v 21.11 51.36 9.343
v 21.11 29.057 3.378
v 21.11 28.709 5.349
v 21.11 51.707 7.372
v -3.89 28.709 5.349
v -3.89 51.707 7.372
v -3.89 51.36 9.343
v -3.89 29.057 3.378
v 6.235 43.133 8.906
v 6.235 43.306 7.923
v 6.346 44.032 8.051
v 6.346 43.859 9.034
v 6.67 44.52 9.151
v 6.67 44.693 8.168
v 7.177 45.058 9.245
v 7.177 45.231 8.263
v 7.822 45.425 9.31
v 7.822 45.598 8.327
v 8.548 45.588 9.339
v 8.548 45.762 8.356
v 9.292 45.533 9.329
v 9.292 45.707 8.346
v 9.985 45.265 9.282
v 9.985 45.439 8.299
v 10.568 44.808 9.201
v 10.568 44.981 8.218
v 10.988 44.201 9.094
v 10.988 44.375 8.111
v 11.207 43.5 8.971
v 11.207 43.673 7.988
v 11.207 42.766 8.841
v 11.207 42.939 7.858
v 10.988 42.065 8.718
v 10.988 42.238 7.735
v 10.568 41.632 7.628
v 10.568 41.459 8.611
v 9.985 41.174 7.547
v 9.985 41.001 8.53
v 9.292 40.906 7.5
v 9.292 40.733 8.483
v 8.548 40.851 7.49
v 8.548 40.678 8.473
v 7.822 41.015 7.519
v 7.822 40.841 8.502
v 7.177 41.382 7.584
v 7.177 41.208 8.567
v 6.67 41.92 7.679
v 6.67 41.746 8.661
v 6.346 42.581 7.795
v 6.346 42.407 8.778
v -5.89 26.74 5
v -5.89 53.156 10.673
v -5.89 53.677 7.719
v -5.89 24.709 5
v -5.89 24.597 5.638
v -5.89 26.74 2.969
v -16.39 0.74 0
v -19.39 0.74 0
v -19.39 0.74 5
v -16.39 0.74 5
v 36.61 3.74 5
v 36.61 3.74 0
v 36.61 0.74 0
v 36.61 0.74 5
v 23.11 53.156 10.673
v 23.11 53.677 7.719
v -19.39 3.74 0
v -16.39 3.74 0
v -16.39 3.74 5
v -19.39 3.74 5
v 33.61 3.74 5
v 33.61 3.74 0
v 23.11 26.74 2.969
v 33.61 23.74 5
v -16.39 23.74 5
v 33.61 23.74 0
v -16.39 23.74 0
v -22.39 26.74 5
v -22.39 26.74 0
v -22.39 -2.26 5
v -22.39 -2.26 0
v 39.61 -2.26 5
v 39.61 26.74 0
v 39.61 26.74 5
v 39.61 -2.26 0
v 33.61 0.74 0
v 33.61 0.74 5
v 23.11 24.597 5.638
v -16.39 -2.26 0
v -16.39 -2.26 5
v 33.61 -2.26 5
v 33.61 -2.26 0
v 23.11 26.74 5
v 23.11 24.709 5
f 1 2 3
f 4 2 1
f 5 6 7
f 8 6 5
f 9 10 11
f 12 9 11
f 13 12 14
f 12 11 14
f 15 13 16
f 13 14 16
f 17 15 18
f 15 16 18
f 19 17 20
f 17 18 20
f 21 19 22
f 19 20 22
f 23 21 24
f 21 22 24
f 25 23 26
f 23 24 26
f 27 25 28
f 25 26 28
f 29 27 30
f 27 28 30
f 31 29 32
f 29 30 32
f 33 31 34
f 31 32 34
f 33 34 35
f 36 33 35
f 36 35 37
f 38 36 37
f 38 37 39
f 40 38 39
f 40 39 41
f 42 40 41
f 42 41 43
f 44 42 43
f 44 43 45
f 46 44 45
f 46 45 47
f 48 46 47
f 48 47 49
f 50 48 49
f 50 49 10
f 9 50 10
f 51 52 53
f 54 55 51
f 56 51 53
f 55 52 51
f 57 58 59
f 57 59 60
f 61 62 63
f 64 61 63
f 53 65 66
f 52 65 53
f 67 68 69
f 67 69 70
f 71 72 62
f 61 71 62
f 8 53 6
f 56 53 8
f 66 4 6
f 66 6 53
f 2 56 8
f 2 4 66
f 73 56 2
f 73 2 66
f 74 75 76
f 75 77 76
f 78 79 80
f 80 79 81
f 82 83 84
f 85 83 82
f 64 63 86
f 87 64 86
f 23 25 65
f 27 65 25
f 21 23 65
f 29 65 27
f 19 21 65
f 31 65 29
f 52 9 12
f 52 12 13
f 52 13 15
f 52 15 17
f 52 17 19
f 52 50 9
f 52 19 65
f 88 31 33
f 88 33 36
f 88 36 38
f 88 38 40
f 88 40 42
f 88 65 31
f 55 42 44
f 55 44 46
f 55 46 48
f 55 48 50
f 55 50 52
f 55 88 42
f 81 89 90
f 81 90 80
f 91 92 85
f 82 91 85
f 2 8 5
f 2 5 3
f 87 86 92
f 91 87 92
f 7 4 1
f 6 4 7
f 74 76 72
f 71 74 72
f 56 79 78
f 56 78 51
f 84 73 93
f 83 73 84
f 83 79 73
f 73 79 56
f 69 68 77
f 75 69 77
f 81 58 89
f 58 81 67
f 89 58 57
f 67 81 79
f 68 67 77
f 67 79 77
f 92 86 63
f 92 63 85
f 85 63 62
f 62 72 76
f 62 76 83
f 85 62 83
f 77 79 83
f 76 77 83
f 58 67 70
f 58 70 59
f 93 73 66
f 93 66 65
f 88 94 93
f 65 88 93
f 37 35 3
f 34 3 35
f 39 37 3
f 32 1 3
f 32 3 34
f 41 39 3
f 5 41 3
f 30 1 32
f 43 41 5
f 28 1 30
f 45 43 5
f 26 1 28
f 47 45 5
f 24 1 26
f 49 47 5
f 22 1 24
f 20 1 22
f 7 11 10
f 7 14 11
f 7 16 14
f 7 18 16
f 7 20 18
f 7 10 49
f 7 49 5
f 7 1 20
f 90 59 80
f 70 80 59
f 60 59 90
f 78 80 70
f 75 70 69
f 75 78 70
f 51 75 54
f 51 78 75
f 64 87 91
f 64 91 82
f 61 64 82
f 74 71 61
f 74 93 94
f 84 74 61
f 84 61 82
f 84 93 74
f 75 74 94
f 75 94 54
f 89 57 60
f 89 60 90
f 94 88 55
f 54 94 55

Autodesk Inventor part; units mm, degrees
ref_plane "YZ Plane" through (0, 0, 0) normal (1, 0, 0) x (0, 1, 0)
ref_plane "XZ Plane" through (0, 0, 0) normal (0, 1, 0) x (-1, 0, 0)
ref_plane "XY Plane" through (0, 0, 0) normal (0, 0, 1) x (1, 0, 0)
sketch "Esquisse1" plane through (0, 0, 0) normal (0, 0, 1) x (1, 0, 0)
  line L0 (-16.3902, 3.7398) -> (-19.3902, 3.7398)
  line L1 (-19.3902, 3.7398) -> (-19.3902, 0.7398)
  line L2 (-19.3902, 0.7398) -> (-16.3902, 0.7398)
  line L3 (-16.3902, 0.7398) -> (-16.3902, -2.2602)
  line L4 (-16.3902, -2.2602) -> (-22.3902, -2.2602)
  line L5 (-16.3902, 3.7398) -> (-16.3902, 23.7398)
  line L6 (33.6098, 23.7398) -> (33.6098, 3.7398)
  line L7 (33.6098, 3.7398) -> (36.6098, 3.7398)
  line L8 (36.6098, 3.7398) -> (36.6098, 0.7398)
  line L9 (36.6098, 0.7398) -> (33.6098, 0.7398)
  line L10 (33.6098, 0.7398) -> (33.6098, -2.2602)
  line L11 (33.6098, -2.2602) -> (39.6098, -2.2602)
  line L12 (-22.3902, 26.7398) -> (39.6098, 26.7398)
  line L13 (-16.3902, 23.7398) -> (33.6098, 23.7398)
  line L14 (-22.3902, 26.7398) -> (-22.3902, -2.2602)
  line L15 (39.6098, 26.7398) -> (39.6098, -2.2602)
  point P0 (0, 0)
  dimension "d0" = 56
  dimension "d1" = 3
  dimension "d2" = 3
  dimension "d3" = 3
  dimension "d4" = 3
  dimension "d5" = 20
  dimension "d6" = 20
  dimension "d7" = 50
  dimension "d8" = 3
  dimension "d9" = 6
  dimension "d10" = 6
  dimension "d11" = 3
  dimension "d12" = 3
extrude "Extrusion1" add sketch "Esquisse1" along normal blind 5
ref_plane "Plan de construction1" through (39.6098, 26.7398, 5) normal (0, 0.9848, 0.1736) x (-1, 0, 0)
sketch "Esquisse2" plane through (39.6098, 26.7398, 5) normal (0, 0.9848, 0.1736) x (-1, 0, 0)
  line L0 (45.5, -2) -> (16.5, -2)
  line L1 (16.5, -2) -> (16.5, 1)
  line L2 (16.5, 1) -> (45.5, 1)
  line L3 (45.5, 1) -> (45.5, -2)
  line L4 (0, 0) -> (62, 0) projected
  line L5 (0, -4.924) -> (0, 0) projected
  point P0 (39.6098, -0.2807)
  dimension "d16" = 29
  dimension "d17" = 3
  dimension "d18" = 1
  dimension "d23" = 16.5
extrude "Extrusion2" add sketch "Esquisse2" along normal blind 27 and the other way blind 2
sketch "Esquisse3" plane through (23.1098, 26.7398, 2.9691) normal (0, 0.1736, -0.9848) x (-1, 0, 0)
  line L0 (2, 25.3527) -> (27, 25.3527)
  line L1 (27, 25.3527) -> (27, 2.3527)
  line L2 (27, 2.3527) -> (2, 2.3527)
  line L3 (2, 2.3527) -> (2, 25.3527)
  line L4 (0, 27.3527) -> (29, 27.3527) projected
  line L5 (29, 0) -> (29, 27.3527) projected
  line L6 (-28.9, 0.3527) -> (57.9, 0.3527) projected
  line L7 (0, 0) -> (0, 27.3527) projected
  point P0 (23.1098, -26.8492)
  dimension "d24" = 2
  dimension "d25" = 2
  dimension "d26" = 2
  dimension "d27" = 2
extrude "Extrusion3" cut sketch "Esquisse3" against normal blind 2 contours L0 L1 L2 L3
sketch "Esquisse4" plane through (23.1098, 26.3925, 4.9388) normal (0, 0.1736, -0.9848) x (-1, 0, 0)
  circle A0 centre (14.3745, 17.1752) radius 2.5
  point P0 (23.1098, -26.8492)
  dimension "d30" = 5
extrude "Extrusion4" cut sketch "Esquisse4" against normal blind 10
properties part number "support_caméra"
